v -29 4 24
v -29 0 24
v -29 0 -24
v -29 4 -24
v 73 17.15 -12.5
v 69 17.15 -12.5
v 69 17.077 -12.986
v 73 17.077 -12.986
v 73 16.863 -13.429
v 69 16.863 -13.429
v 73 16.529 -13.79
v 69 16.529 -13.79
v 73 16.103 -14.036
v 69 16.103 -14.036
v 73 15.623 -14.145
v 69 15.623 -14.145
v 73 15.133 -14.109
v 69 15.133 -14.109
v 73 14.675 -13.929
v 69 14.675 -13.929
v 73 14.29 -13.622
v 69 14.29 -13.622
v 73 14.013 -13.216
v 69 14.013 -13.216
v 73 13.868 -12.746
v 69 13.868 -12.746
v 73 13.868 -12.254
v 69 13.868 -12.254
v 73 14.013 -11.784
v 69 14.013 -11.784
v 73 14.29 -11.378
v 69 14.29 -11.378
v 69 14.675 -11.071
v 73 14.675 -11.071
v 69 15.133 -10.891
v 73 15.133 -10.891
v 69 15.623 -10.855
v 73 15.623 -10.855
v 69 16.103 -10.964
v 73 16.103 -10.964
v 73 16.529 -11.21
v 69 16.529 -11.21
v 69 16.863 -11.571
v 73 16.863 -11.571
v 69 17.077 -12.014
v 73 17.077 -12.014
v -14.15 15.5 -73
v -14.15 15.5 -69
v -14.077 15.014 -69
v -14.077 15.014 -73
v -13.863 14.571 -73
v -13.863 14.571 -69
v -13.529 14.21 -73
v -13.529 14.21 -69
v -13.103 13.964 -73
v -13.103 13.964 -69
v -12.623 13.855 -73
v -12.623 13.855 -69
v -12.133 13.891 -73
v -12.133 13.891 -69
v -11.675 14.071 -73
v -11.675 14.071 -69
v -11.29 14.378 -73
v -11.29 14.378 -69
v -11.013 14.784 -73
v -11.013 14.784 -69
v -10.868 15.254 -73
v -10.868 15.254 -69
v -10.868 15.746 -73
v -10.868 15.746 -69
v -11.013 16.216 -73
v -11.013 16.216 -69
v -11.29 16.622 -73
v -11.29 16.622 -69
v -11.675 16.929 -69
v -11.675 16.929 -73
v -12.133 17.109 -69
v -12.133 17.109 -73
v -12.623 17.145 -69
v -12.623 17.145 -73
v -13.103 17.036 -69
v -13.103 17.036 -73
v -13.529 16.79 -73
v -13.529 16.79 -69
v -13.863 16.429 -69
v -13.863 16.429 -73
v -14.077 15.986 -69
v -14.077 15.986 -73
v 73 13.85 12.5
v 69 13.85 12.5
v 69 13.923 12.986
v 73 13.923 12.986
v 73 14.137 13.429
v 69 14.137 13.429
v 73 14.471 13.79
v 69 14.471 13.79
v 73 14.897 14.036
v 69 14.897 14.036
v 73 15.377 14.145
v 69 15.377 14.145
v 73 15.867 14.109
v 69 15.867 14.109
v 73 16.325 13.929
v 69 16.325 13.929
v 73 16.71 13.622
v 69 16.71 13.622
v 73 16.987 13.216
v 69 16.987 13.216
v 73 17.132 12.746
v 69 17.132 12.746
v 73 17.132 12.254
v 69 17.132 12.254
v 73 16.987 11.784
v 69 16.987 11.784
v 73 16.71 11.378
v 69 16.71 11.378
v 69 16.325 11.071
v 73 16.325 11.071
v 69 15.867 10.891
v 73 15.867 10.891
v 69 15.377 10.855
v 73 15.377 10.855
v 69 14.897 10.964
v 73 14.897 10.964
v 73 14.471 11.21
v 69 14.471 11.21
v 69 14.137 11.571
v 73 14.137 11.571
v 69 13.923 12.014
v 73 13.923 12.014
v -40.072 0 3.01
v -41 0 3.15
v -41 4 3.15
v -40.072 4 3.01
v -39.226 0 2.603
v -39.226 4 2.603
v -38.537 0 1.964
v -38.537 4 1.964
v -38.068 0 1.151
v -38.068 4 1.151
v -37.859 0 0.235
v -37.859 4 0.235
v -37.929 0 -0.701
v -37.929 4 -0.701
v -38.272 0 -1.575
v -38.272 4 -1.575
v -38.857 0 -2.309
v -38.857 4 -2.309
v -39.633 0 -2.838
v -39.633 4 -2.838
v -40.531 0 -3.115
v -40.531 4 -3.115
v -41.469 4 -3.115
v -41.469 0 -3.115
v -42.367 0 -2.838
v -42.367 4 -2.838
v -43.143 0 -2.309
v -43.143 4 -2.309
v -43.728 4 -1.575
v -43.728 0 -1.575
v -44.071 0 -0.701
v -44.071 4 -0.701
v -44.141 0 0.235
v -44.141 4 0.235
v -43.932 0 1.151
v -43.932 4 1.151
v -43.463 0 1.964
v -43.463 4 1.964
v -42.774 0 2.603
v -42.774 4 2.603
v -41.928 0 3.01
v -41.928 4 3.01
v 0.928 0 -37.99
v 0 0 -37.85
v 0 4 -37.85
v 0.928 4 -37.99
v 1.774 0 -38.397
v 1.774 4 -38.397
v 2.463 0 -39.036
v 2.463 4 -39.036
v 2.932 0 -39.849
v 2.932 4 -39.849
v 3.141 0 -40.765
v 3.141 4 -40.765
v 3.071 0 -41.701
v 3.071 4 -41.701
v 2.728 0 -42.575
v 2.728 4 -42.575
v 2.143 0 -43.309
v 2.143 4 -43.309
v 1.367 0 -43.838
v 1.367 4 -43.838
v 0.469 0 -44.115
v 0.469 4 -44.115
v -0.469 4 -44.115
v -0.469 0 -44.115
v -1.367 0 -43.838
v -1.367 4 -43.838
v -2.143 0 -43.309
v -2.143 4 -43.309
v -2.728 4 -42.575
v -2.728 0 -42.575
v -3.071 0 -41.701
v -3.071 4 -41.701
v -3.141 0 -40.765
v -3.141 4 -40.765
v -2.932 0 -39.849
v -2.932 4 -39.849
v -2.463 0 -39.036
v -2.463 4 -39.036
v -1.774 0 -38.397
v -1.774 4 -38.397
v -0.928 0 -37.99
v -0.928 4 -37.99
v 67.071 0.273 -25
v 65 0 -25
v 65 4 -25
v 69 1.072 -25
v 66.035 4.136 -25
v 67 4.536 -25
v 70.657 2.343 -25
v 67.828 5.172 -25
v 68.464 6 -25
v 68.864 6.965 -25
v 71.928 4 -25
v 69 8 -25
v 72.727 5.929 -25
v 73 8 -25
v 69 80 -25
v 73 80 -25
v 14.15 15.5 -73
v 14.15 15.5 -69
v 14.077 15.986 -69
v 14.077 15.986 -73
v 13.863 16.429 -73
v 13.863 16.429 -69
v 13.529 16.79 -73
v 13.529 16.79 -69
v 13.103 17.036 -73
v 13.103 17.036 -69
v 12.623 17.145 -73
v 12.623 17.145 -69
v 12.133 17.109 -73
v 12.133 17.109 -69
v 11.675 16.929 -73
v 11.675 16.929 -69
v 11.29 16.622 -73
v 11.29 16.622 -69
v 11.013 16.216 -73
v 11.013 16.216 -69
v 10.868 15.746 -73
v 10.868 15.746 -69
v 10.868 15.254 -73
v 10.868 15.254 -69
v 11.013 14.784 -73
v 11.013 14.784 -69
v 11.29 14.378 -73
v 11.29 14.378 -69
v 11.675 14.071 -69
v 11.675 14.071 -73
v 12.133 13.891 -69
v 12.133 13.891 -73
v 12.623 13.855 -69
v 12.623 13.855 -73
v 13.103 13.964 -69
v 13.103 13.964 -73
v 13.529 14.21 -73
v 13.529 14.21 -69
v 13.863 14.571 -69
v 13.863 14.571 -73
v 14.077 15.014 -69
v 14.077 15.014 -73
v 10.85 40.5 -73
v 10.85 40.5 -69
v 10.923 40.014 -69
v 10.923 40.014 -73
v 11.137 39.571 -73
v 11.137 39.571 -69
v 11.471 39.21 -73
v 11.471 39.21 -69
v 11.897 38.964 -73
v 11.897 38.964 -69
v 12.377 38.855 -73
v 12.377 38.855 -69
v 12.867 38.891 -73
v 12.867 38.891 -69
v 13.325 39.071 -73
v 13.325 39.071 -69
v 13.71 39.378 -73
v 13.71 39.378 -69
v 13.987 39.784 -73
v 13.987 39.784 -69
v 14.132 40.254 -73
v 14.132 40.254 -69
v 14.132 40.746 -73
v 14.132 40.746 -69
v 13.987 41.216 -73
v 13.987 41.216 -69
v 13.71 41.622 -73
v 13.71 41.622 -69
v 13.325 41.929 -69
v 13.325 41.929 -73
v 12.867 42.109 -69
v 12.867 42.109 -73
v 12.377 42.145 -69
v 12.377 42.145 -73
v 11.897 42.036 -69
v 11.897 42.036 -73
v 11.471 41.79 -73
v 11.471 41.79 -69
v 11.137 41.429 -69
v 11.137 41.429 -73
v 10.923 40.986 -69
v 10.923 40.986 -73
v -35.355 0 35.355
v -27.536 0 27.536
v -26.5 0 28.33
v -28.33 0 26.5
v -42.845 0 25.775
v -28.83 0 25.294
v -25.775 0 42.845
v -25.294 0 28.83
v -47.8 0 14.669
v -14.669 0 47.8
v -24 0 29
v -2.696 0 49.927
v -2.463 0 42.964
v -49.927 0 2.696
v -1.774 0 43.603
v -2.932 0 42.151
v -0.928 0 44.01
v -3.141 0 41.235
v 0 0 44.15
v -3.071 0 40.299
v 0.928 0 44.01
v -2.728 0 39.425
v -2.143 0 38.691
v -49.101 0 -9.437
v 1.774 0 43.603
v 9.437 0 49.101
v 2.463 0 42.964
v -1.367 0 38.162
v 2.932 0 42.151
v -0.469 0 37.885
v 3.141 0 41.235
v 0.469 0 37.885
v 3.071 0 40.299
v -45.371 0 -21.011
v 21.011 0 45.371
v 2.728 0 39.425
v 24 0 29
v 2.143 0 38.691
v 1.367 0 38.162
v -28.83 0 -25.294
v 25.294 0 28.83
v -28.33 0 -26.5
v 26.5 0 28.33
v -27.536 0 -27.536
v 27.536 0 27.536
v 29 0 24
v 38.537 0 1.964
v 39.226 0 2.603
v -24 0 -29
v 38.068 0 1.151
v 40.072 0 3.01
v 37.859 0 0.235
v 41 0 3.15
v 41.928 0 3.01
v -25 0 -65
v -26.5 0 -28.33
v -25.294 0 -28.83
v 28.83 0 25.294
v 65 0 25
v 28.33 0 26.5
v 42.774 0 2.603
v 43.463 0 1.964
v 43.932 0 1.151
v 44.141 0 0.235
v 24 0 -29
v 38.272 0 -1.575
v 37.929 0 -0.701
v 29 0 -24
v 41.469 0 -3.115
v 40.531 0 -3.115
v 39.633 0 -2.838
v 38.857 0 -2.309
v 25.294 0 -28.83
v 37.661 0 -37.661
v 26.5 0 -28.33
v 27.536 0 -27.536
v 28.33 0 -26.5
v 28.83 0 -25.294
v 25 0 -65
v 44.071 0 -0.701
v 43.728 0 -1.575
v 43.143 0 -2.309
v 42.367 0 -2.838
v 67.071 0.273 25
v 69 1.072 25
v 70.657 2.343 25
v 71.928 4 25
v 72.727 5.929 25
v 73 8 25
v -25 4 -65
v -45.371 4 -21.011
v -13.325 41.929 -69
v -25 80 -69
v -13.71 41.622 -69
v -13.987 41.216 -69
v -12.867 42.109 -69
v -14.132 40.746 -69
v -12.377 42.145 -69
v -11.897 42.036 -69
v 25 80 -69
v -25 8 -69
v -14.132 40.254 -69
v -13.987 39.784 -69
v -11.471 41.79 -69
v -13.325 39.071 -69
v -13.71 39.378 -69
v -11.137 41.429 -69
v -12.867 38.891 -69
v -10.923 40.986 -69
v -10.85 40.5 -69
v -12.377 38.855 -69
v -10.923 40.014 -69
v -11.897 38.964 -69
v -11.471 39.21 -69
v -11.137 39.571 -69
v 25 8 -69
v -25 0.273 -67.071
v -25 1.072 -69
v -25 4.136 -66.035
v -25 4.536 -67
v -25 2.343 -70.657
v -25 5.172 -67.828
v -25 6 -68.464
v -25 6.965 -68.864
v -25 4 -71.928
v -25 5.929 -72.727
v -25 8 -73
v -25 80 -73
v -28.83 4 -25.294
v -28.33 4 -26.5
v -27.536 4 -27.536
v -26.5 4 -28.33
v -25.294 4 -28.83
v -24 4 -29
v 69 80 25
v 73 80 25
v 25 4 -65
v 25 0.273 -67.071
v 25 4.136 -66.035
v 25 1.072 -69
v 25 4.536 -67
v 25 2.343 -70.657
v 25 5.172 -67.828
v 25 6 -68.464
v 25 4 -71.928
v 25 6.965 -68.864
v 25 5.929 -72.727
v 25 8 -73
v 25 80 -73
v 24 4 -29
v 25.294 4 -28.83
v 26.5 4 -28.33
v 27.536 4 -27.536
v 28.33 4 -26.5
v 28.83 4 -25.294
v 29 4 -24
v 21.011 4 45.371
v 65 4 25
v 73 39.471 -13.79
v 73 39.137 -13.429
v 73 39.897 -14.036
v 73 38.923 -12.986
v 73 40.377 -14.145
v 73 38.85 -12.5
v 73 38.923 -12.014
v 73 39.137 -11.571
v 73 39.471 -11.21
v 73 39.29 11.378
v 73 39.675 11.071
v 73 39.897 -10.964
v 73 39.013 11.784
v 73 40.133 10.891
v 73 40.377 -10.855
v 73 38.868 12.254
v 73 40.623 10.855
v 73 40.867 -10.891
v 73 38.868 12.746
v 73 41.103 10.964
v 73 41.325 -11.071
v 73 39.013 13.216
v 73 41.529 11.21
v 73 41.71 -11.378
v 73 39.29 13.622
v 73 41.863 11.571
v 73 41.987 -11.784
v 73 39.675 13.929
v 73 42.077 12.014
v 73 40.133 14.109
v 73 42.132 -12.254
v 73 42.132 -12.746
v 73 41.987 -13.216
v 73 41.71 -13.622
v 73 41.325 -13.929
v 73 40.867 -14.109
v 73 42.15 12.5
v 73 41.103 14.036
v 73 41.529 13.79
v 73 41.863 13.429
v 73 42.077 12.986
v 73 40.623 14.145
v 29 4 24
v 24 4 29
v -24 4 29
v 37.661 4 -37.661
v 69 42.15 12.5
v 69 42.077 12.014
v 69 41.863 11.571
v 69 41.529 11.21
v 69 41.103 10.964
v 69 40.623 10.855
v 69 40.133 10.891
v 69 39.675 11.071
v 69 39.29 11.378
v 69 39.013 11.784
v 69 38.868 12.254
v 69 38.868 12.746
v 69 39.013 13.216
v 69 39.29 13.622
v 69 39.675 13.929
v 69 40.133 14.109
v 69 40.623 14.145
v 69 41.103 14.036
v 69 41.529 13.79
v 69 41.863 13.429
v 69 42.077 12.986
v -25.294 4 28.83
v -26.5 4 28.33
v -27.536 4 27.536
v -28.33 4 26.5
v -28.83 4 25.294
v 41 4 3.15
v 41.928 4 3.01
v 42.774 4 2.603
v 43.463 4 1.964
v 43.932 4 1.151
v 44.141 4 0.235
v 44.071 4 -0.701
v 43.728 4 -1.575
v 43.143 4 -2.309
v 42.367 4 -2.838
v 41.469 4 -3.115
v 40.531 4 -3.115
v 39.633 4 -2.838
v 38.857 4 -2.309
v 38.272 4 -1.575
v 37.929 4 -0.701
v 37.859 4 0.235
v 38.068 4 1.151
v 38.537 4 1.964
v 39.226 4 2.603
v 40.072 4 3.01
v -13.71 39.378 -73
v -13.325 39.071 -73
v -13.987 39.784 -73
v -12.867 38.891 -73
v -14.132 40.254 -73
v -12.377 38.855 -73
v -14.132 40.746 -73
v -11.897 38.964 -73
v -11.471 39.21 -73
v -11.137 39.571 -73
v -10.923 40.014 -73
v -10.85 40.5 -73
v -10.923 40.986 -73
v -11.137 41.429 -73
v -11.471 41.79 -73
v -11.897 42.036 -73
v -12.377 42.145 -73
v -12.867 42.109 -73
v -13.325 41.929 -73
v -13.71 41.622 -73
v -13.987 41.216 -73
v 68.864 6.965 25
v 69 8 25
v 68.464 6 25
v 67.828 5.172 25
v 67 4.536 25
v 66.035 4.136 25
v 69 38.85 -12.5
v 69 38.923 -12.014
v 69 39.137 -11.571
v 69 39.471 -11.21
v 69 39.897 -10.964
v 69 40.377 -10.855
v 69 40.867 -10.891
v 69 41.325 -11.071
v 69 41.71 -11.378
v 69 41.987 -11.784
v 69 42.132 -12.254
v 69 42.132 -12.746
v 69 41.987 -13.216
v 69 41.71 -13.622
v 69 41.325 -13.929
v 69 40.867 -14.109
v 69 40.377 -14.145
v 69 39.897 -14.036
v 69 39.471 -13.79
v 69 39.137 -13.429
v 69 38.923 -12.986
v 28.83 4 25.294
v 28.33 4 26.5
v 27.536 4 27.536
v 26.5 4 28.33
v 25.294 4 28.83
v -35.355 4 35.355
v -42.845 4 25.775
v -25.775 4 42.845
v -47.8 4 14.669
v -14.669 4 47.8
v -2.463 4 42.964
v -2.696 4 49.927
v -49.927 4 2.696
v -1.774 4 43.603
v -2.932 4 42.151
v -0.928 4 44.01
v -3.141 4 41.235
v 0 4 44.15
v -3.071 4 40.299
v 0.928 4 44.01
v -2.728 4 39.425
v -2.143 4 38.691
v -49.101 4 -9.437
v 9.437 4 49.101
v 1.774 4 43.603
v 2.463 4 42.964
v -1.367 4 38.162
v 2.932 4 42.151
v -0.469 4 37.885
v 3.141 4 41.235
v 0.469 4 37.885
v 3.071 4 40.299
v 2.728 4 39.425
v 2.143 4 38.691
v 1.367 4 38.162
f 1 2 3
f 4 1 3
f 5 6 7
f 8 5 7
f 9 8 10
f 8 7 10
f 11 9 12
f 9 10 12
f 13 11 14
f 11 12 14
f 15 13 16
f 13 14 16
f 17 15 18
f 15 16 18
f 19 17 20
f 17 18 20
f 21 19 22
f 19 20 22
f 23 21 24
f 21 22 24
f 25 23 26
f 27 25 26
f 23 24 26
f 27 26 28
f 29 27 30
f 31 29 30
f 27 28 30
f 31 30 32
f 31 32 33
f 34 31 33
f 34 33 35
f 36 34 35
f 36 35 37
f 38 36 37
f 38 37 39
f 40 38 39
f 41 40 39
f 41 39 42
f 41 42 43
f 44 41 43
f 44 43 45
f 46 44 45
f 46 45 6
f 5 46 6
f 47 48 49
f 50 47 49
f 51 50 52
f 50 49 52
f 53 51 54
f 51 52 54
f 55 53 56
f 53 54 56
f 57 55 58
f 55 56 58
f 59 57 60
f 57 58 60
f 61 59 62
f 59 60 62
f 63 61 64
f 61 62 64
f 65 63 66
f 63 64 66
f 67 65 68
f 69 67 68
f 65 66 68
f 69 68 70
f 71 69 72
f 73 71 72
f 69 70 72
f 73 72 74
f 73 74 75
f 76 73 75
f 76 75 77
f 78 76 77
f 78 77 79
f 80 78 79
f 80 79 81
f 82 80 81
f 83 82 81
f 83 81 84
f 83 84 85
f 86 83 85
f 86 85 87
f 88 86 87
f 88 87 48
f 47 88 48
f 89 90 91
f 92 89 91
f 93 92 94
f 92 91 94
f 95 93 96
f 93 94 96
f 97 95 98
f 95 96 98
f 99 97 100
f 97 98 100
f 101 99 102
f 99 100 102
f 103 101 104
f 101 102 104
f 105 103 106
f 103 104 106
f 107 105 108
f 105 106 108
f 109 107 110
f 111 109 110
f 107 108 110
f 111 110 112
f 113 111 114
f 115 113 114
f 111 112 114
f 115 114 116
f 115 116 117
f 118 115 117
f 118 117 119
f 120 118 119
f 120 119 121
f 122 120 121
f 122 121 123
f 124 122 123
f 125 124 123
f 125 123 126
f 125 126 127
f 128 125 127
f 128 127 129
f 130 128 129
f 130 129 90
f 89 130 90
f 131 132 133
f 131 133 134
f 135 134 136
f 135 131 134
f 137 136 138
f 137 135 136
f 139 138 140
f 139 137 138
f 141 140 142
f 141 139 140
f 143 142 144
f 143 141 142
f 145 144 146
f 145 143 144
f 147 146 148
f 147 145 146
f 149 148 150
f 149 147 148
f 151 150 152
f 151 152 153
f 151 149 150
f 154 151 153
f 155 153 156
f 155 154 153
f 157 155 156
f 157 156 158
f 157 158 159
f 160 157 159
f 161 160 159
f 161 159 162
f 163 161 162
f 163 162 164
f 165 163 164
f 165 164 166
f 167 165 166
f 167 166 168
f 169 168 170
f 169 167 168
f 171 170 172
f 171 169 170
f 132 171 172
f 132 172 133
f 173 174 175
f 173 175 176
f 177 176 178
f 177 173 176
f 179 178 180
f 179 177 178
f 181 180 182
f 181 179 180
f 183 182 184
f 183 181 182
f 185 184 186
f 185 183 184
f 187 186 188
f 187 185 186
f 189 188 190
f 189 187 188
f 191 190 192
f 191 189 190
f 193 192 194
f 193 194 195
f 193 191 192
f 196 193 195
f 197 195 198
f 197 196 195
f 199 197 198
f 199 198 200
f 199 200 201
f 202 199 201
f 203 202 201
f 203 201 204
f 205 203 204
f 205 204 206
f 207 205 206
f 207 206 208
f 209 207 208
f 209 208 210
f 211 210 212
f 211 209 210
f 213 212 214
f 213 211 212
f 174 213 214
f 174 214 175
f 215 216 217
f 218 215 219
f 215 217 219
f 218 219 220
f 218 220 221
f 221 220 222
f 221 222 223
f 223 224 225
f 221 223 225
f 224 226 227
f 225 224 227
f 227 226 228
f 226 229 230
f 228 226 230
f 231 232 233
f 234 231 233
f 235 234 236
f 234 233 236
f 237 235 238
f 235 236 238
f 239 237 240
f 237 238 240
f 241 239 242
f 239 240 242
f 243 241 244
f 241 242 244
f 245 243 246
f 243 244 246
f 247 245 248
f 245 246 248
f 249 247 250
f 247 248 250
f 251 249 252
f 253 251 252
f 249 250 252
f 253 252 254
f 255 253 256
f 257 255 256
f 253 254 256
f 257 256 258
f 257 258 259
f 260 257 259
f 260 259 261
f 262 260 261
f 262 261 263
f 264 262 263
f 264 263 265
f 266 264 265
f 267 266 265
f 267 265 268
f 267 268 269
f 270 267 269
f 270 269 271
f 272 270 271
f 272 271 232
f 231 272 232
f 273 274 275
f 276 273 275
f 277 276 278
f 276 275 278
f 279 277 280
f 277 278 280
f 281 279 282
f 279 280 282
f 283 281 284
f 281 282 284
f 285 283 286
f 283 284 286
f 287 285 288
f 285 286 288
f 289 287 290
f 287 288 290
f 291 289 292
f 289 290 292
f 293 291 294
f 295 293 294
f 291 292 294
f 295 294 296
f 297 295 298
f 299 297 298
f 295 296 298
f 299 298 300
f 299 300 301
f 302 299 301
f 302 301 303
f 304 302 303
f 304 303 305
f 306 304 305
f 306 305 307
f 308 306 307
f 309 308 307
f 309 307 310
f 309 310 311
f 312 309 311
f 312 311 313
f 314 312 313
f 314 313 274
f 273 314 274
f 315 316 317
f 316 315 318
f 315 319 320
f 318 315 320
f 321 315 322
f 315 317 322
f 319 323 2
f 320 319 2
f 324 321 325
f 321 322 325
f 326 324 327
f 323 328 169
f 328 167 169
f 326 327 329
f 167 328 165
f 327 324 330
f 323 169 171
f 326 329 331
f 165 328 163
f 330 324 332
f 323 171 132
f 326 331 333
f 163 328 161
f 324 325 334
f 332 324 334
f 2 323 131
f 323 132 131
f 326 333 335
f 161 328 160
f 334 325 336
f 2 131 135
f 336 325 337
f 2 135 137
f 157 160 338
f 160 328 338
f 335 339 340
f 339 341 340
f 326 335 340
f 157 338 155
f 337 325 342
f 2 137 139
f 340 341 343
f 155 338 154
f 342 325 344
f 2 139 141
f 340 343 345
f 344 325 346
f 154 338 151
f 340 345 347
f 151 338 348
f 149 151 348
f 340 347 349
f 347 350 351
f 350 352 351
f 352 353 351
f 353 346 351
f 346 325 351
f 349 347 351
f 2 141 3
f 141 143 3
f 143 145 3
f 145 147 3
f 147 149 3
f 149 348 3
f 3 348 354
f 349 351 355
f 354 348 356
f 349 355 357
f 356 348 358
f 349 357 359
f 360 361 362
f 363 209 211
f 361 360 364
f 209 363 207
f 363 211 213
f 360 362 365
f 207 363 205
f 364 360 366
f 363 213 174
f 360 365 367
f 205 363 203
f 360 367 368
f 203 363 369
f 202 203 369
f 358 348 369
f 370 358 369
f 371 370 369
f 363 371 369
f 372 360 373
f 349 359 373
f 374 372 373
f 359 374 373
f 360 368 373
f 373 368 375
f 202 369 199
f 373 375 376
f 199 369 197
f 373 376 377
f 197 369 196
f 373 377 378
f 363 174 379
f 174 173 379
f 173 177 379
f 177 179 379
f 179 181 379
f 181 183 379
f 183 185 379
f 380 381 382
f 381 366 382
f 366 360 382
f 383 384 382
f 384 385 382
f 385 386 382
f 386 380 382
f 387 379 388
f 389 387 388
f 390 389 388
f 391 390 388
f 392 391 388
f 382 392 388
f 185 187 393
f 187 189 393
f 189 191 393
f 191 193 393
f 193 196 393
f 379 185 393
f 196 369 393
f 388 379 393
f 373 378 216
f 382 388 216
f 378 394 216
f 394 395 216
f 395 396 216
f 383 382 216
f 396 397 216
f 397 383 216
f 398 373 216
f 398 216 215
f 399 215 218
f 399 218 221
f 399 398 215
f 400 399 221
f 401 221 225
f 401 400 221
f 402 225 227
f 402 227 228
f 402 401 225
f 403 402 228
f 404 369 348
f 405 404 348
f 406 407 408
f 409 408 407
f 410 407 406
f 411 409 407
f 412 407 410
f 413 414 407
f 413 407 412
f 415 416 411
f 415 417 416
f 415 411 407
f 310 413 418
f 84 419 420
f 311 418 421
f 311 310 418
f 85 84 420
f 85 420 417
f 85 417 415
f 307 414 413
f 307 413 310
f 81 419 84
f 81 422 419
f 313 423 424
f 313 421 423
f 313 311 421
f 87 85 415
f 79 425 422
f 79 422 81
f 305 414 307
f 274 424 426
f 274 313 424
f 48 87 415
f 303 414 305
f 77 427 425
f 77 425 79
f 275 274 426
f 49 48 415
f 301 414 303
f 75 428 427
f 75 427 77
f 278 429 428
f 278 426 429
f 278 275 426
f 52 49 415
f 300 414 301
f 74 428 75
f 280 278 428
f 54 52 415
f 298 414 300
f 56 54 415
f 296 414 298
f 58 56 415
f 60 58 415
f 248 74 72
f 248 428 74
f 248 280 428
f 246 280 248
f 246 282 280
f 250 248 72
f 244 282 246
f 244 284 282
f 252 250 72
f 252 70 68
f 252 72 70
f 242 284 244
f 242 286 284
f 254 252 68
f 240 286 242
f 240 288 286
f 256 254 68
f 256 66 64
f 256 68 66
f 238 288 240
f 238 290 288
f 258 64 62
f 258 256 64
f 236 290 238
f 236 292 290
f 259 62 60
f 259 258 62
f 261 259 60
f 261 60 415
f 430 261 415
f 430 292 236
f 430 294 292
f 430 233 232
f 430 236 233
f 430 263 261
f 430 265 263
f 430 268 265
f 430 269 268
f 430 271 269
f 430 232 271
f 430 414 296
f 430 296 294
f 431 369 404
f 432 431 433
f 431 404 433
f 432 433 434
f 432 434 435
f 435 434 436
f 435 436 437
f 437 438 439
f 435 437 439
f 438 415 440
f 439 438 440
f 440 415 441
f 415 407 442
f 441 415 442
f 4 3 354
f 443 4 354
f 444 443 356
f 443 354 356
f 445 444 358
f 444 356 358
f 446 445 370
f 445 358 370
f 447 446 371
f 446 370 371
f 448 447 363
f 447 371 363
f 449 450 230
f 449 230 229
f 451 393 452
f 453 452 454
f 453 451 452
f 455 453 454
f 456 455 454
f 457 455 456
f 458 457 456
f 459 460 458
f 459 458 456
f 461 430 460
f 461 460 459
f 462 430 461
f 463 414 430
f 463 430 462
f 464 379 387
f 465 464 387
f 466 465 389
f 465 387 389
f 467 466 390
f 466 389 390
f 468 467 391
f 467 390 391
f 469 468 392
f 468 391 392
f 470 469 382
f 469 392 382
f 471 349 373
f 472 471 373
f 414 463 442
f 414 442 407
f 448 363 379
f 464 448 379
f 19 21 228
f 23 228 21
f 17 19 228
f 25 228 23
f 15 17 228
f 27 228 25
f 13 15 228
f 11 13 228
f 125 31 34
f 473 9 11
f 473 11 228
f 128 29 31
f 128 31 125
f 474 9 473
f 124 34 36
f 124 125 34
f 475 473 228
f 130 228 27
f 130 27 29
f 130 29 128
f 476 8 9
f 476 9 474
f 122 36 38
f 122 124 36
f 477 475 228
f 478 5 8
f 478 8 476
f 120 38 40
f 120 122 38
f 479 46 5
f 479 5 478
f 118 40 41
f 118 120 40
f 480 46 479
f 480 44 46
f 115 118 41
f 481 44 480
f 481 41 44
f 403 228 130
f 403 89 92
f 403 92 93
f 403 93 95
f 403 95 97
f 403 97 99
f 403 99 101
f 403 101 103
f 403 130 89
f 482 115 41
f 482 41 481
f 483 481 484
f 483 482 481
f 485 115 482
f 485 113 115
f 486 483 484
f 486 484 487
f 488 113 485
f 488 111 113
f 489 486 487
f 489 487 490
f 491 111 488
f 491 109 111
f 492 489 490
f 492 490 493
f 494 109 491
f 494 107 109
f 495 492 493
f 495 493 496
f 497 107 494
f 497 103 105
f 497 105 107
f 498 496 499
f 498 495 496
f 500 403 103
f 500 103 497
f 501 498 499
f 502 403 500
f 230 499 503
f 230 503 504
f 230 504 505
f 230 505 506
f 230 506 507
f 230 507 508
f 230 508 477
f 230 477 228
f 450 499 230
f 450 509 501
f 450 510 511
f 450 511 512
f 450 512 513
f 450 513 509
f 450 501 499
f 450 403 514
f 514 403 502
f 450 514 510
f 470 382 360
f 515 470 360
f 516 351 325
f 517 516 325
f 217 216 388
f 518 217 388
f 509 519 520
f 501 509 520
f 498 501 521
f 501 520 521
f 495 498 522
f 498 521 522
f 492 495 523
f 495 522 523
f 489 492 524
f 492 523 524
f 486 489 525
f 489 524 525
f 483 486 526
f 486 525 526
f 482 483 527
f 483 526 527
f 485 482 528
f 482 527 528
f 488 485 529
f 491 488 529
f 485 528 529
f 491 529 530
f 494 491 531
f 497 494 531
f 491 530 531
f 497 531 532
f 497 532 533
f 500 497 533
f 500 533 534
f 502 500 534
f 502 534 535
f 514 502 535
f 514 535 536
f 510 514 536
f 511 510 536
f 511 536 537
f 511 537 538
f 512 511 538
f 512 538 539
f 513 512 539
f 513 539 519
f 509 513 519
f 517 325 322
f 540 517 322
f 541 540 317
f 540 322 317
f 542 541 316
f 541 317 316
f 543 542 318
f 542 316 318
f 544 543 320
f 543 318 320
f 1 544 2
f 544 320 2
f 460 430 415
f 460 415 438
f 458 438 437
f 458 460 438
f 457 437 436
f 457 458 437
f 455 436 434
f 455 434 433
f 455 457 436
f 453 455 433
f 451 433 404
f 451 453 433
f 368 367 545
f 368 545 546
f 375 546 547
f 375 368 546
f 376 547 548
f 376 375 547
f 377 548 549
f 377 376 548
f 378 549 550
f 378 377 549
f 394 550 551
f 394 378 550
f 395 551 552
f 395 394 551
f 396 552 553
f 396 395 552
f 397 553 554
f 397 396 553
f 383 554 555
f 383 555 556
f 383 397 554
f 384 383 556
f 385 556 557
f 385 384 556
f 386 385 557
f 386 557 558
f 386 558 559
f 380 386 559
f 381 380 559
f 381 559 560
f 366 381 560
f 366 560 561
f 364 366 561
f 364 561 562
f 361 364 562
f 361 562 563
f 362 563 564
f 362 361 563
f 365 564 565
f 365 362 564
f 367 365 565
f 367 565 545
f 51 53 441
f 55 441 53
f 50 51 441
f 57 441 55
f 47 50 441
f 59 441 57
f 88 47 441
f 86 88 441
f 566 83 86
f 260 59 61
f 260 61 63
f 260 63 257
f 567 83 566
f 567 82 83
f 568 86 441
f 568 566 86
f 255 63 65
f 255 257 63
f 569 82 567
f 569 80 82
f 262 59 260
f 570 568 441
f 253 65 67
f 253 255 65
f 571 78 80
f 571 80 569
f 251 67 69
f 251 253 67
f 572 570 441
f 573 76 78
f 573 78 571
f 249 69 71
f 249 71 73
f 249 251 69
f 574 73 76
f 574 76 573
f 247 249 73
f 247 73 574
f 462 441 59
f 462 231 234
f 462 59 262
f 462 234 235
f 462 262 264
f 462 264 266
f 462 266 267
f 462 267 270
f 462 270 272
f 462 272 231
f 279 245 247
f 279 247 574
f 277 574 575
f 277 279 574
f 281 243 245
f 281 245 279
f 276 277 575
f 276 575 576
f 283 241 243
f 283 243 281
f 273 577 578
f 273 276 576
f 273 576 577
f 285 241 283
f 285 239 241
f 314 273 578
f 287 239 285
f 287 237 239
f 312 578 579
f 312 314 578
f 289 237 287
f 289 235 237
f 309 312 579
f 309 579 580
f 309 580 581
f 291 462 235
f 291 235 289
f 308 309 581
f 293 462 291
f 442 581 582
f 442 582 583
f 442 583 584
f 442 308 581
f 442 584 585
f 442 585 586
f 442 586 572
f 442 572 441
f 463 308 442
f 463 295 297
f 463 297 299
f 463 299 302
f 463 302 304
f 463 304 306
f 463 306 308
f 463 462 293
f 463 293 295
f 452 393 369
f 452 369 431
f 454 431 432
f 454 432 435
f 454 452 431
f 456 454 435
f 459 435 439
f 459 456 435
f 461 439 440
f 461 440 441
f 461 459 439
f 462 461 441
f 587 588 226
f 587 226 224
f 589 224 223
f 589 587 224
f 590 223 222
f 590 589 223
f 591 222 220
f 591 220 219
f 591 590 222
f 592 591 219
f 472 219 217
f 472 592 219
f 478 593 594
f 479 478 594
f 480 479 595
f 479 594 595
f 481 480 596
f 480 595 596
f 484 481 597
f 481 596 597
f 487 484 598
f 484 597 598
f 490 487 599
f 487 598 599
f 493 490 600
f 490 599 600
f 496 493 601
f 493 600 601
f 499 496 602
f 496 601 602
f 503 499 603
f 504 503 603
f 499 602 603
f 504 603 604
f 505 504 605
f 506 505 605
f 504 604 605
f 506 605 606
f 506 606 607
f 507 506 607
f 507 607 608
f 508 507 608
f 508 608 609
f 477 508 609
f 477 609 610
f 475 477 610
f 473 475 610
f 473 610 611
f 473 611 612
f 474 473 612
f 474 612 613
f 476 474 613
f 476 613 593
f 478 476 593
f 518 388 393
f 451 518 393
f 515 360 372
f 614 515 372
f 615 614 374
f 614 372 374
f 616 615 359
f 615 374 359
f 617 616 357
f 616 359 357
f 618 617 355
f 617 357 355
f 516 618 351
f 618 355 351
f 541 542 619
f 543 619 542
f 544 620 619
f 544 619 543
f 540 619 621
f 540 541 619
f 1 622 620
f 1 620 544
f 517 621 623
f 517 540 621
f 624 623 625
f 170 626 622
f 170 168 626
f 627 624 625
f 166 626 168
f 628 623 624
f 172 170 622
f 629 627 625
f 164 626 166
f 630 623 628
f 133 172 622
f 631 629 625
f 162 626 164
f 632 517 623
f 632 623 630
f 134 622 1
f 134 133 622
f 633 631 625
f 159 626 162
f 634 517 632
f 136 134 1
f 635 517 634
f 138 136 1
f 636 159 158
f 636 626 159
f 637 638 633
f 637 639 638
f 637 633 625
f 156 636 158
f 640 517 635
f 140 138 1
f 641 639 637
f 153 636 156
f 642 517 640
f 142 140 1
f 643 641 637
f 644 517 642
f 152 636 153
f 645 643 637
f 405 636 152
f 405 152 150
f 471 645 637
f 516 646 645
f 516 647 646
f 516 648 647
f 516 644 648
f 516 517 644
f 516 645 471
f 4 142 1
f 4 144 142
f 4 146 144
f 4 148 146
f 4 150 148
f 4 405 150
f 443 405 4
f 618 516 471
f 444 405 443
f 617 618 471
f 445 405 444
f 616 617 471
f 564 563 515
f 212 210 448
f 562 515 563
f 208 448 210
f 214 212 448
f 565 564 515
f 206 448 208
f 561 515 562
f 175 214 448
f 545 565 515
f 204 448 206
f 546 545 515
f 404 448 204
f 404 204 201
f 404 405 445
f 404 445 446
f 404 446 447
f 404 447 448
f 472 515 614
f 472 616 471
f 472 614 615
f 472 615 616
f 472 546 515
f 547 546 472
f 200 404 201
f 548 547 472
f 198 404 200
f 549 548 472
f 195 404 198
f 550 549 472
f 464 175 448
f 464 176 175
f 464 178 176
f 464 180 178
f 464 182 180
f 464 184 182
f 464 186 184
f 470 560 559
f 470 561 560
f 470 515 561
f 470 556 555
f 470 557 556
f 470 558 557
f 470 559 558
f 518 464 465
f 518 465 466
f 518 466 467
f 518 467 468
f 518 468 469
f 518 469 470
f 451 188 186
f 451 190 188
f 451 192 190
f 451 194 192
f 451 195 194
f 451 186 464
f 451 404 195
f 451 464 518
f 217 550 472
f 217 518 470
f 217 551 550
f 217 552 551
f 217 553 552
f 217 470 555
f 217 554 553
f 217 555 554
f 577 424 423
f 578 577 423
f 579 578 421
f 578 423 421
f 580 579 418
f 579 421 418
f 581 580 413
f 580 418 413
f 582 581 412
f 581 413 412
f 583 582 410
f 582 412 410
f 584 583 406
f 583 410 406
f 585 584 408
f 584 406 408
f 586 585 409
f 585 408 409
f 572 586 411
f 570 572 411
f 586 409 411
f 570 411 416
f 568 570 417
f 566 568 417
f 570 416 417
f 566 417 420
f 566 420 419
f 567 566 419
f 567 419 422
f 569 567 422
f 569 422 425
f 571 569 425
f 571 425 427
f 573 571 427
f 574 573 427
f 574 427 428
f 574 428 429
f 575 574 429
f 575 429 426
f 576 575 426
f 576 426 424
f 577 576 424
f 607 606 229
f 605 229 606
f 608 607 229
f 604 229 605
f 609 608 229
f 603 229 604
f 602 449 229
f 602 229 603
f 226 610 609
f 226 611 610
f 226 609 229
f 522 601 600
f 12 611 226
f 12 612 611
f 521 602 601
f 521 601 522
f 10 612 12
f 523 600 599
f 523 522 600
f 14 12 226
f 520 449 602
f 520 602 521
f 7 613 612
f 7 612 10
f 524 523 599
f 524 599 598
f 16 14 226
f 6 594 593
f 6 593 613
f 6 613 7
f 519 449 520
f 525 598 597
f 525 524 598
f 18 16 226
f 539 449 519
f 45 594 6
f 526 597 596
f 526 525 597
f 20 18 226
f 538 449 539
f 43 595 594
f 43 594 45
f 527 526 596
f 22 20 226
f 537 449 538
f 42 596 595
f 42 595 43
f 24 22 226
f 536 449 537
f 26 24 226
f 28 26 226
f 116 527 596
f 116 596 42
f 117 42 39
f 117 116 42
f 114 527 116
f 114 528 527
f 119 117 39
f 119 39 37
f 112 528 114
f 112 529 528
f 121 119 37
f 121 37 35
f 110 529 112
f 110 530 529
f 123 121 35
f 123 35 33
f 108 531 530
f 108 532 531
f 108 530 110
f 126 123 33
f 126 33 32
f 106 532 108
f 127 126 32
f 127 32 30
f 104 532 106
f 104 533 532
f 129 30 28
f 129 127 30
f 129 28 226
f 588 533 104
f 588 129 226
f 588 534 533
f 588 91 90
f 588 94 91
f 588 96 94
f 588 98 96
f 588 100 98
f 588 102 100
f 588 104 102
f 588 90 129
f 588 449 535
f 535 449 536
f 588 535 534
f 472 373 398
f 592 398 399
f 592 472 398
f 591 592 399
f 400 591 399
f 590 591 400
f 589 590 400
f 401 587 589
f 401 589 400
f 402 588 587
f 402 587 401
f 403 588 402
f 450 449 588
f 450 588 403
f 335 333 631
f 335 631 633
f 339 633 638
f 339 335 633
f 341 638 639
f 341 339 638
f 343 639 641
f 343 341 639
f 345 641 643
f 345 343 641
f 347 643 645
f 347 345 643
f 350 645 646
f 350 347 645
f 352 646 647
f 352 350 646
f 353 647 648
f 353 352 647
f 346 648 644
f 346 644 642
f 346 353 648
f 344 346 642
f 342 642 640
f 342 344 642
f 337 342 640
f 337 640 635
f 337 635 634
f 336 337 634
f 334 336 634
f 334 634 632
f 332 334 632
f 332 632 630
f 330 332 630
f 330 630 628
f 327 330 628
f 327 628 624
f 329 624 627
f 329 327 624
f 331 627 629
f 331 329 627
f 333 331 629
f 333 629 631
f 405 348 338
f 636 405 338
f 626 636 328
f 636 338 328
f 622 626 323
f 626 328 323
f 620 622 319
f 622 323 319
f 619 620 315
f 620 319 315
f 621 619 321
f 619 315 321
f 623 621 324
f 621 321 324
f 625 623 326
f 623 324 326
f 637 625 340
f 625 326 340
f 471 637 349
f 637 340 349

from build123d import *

# Parameters (mm, degrees)
SKETCH_1_R                  = 3.15
EXTRUDE_1_DEPTH             = 4
SM_EDGE_FLANGE_1_DEPTH      = 50
SM_EDGE_FLANGE_1_BEND_DEPTH = 50
SKETCH_21_R                 = 1.65
CUT_EXTRUDE_1_DEPTH         = 161.903697907
SKETCH_22_R                 = 1.65
CUT_EXTRUDE_2_DEPTH         = 161.903697907


# Sheet-metal steps are written as plain solids
with BuildPart() as part:
    # Sketch 1 → 凸台-拉伸1 (new body)
    with BuildSketch(Plane(origin=(0, 0, 0), x_dir=(1, 0, 0), z_dir=(0, 1, 0))):
        with BuildLine():
            Line((-25, 65), (-45.371050591, 21.011134388))
            ThreePointArc((-45.371050591, 21.011134388), (-35.355339059, -35.355339059), (21.011134388, -45.371050591))
            Line((21.011134388, -45.371050591), (65, -25))
            Line((65, -25), (65, 25))
            Line((65, 25), (37.660706721, 37.660706721))
            Line((37.660706721, 37.660706721), (25, 65))
            Line((25, 65), (-25, 65))
        make_face()
        with Locations(Location((0, 41, 0), (0, 0, 270))):
            Circle(SKETCH_1_R, mode=Mode.SUBTRACT)
        with Locations(Location((0, -41, 0), (0, 0, 270))):
            Circle(SKETCH_1_R, mode=Mode.SUBTRACT)
        with Locations(Location((-41, 0, 0), (0, 0, 270))):
            Circle(SKETCH_1_R, mode=Mode.SUBTRACT)
        with BuildLine():
            ThreePointArc((29, -24), (27.535533906, -27.535533906), (24, -29))
            Line((24, -29), (-24, -29))
            ThreePointArc((-24, -29), (-27.535533906, -27.535533906), (-29, -24))
            Line((-29, -24), (-29, 24))
            ThreePointArc((-29, 24), (-27.535533906, 27.535533906), (-24, 29))
            Line((-24, 29), (24, 29))
            ThreePointArc((24, 29), (27.535533906, 27.535533906), (29, 24))
            Line((29, 24), (29, -24))
        make_face(mode=Mode.SUBTRACT)
        with Locations(Location((41, 0, 0), (0, 0, 270))):
            Circle(SKETCH_1_R, mode=Mode.SUBTRACT)
    extrude(amount=EXTRUDE_1_DEPTH)

    # 边线-法兰1 section (across the edge) → 边线-法兰1 (add)
    with BuildSketch(Plane(origin=(69, 4, 25), x_dir=(-1, 0, 0), z_dir=(0, 0, -1))):
        with BuildLine():
            Line((-4, 4), (-4, 76))
            Line((-4, 76), (0, 76))
            Line((0, 76), (0, 4))
            ThreePointArc((0, 4), (1.171572875, 1.171572875), (4, 0))
            Line((4, 0), (4, -4))
            ThreePointArc((4, -4), (-1.656854249, -1.656854249), (-4, 4))
        make_face()
    extrude(amount=SM_EDGE_FLANGE_1_DEPTH)

    # 边线-法兰1 section 2 (across the edge) → 边线-法兰1 bend (add)
    with BuildSketch(Plane(origin=(25, 4, -69), x_dir=(0, 0, 1), z_dir=(-1, 0, 0))):
        with BuildLine():
            Line((-4, 4), (-4, 76))
            Line((-4, 76), (0, 76))
            Line((0, 76), (0, 4))
            ThreePointArc((0, 4), (1.171572875, 1.171572875), (4, 0))
            Line((4, 0), (4, -4))
            ThreePointArc((4, -4), (-1.656854249, -1.656854249), (-4, 4))
        make_face()
    extrude(amount=SM_EDGE_FLANGE_1_BEND_DEPTH)

    # 草图21 → 切除-拉伸1 (cut, through all)
    with BuildSketch(Plane.XY.offset(-69)):
        with Locations((-12.5, 40.5)):
            Circle(SKETCH_21_R)
        with Locations(Location((12.5, 40.5, 0), (0, 0, 180))):
            Circle(SKETCH_21_R)
        with Locations((12.5, 15.5)):
            Circle(SKETCH_21_R)
        with Locations(Location((-12.5, 15.5, 0), (0, 0, 180))):
            Circle(SKETCH_21_R)
    extrude(amount=-CUT_EXTRUDE_1_DEPTH, mode=Mode.SUBTRACT)

    # 草图22 → 切除-拉伸2 (cut, through all)
    with BuildSketch(Plane.ZY.offset(-69)):
        with Locations(Location((-12.5, 40.5, 0), (0, 0, 270))):
            Circle(SKETCH_22_R)
        with Locations(Location((12.5, 40.5, 0), (0, 0, 90))):
            Circle(SKETCH_22_R)
        with Locations(Location((12.5, 15.5, 0), (0, 0, 270))):
            Circle(SKETCH_22_R)
        with Locations(Location((-12.5, 15.5, 0), (0, 0, 90))):
            Circle(SKETCH_22_R)
    extrude(amount=-CUT_EXTRUDE_2_DEPTH, mode=Mode.SUBTRACT)


solid = part.part
